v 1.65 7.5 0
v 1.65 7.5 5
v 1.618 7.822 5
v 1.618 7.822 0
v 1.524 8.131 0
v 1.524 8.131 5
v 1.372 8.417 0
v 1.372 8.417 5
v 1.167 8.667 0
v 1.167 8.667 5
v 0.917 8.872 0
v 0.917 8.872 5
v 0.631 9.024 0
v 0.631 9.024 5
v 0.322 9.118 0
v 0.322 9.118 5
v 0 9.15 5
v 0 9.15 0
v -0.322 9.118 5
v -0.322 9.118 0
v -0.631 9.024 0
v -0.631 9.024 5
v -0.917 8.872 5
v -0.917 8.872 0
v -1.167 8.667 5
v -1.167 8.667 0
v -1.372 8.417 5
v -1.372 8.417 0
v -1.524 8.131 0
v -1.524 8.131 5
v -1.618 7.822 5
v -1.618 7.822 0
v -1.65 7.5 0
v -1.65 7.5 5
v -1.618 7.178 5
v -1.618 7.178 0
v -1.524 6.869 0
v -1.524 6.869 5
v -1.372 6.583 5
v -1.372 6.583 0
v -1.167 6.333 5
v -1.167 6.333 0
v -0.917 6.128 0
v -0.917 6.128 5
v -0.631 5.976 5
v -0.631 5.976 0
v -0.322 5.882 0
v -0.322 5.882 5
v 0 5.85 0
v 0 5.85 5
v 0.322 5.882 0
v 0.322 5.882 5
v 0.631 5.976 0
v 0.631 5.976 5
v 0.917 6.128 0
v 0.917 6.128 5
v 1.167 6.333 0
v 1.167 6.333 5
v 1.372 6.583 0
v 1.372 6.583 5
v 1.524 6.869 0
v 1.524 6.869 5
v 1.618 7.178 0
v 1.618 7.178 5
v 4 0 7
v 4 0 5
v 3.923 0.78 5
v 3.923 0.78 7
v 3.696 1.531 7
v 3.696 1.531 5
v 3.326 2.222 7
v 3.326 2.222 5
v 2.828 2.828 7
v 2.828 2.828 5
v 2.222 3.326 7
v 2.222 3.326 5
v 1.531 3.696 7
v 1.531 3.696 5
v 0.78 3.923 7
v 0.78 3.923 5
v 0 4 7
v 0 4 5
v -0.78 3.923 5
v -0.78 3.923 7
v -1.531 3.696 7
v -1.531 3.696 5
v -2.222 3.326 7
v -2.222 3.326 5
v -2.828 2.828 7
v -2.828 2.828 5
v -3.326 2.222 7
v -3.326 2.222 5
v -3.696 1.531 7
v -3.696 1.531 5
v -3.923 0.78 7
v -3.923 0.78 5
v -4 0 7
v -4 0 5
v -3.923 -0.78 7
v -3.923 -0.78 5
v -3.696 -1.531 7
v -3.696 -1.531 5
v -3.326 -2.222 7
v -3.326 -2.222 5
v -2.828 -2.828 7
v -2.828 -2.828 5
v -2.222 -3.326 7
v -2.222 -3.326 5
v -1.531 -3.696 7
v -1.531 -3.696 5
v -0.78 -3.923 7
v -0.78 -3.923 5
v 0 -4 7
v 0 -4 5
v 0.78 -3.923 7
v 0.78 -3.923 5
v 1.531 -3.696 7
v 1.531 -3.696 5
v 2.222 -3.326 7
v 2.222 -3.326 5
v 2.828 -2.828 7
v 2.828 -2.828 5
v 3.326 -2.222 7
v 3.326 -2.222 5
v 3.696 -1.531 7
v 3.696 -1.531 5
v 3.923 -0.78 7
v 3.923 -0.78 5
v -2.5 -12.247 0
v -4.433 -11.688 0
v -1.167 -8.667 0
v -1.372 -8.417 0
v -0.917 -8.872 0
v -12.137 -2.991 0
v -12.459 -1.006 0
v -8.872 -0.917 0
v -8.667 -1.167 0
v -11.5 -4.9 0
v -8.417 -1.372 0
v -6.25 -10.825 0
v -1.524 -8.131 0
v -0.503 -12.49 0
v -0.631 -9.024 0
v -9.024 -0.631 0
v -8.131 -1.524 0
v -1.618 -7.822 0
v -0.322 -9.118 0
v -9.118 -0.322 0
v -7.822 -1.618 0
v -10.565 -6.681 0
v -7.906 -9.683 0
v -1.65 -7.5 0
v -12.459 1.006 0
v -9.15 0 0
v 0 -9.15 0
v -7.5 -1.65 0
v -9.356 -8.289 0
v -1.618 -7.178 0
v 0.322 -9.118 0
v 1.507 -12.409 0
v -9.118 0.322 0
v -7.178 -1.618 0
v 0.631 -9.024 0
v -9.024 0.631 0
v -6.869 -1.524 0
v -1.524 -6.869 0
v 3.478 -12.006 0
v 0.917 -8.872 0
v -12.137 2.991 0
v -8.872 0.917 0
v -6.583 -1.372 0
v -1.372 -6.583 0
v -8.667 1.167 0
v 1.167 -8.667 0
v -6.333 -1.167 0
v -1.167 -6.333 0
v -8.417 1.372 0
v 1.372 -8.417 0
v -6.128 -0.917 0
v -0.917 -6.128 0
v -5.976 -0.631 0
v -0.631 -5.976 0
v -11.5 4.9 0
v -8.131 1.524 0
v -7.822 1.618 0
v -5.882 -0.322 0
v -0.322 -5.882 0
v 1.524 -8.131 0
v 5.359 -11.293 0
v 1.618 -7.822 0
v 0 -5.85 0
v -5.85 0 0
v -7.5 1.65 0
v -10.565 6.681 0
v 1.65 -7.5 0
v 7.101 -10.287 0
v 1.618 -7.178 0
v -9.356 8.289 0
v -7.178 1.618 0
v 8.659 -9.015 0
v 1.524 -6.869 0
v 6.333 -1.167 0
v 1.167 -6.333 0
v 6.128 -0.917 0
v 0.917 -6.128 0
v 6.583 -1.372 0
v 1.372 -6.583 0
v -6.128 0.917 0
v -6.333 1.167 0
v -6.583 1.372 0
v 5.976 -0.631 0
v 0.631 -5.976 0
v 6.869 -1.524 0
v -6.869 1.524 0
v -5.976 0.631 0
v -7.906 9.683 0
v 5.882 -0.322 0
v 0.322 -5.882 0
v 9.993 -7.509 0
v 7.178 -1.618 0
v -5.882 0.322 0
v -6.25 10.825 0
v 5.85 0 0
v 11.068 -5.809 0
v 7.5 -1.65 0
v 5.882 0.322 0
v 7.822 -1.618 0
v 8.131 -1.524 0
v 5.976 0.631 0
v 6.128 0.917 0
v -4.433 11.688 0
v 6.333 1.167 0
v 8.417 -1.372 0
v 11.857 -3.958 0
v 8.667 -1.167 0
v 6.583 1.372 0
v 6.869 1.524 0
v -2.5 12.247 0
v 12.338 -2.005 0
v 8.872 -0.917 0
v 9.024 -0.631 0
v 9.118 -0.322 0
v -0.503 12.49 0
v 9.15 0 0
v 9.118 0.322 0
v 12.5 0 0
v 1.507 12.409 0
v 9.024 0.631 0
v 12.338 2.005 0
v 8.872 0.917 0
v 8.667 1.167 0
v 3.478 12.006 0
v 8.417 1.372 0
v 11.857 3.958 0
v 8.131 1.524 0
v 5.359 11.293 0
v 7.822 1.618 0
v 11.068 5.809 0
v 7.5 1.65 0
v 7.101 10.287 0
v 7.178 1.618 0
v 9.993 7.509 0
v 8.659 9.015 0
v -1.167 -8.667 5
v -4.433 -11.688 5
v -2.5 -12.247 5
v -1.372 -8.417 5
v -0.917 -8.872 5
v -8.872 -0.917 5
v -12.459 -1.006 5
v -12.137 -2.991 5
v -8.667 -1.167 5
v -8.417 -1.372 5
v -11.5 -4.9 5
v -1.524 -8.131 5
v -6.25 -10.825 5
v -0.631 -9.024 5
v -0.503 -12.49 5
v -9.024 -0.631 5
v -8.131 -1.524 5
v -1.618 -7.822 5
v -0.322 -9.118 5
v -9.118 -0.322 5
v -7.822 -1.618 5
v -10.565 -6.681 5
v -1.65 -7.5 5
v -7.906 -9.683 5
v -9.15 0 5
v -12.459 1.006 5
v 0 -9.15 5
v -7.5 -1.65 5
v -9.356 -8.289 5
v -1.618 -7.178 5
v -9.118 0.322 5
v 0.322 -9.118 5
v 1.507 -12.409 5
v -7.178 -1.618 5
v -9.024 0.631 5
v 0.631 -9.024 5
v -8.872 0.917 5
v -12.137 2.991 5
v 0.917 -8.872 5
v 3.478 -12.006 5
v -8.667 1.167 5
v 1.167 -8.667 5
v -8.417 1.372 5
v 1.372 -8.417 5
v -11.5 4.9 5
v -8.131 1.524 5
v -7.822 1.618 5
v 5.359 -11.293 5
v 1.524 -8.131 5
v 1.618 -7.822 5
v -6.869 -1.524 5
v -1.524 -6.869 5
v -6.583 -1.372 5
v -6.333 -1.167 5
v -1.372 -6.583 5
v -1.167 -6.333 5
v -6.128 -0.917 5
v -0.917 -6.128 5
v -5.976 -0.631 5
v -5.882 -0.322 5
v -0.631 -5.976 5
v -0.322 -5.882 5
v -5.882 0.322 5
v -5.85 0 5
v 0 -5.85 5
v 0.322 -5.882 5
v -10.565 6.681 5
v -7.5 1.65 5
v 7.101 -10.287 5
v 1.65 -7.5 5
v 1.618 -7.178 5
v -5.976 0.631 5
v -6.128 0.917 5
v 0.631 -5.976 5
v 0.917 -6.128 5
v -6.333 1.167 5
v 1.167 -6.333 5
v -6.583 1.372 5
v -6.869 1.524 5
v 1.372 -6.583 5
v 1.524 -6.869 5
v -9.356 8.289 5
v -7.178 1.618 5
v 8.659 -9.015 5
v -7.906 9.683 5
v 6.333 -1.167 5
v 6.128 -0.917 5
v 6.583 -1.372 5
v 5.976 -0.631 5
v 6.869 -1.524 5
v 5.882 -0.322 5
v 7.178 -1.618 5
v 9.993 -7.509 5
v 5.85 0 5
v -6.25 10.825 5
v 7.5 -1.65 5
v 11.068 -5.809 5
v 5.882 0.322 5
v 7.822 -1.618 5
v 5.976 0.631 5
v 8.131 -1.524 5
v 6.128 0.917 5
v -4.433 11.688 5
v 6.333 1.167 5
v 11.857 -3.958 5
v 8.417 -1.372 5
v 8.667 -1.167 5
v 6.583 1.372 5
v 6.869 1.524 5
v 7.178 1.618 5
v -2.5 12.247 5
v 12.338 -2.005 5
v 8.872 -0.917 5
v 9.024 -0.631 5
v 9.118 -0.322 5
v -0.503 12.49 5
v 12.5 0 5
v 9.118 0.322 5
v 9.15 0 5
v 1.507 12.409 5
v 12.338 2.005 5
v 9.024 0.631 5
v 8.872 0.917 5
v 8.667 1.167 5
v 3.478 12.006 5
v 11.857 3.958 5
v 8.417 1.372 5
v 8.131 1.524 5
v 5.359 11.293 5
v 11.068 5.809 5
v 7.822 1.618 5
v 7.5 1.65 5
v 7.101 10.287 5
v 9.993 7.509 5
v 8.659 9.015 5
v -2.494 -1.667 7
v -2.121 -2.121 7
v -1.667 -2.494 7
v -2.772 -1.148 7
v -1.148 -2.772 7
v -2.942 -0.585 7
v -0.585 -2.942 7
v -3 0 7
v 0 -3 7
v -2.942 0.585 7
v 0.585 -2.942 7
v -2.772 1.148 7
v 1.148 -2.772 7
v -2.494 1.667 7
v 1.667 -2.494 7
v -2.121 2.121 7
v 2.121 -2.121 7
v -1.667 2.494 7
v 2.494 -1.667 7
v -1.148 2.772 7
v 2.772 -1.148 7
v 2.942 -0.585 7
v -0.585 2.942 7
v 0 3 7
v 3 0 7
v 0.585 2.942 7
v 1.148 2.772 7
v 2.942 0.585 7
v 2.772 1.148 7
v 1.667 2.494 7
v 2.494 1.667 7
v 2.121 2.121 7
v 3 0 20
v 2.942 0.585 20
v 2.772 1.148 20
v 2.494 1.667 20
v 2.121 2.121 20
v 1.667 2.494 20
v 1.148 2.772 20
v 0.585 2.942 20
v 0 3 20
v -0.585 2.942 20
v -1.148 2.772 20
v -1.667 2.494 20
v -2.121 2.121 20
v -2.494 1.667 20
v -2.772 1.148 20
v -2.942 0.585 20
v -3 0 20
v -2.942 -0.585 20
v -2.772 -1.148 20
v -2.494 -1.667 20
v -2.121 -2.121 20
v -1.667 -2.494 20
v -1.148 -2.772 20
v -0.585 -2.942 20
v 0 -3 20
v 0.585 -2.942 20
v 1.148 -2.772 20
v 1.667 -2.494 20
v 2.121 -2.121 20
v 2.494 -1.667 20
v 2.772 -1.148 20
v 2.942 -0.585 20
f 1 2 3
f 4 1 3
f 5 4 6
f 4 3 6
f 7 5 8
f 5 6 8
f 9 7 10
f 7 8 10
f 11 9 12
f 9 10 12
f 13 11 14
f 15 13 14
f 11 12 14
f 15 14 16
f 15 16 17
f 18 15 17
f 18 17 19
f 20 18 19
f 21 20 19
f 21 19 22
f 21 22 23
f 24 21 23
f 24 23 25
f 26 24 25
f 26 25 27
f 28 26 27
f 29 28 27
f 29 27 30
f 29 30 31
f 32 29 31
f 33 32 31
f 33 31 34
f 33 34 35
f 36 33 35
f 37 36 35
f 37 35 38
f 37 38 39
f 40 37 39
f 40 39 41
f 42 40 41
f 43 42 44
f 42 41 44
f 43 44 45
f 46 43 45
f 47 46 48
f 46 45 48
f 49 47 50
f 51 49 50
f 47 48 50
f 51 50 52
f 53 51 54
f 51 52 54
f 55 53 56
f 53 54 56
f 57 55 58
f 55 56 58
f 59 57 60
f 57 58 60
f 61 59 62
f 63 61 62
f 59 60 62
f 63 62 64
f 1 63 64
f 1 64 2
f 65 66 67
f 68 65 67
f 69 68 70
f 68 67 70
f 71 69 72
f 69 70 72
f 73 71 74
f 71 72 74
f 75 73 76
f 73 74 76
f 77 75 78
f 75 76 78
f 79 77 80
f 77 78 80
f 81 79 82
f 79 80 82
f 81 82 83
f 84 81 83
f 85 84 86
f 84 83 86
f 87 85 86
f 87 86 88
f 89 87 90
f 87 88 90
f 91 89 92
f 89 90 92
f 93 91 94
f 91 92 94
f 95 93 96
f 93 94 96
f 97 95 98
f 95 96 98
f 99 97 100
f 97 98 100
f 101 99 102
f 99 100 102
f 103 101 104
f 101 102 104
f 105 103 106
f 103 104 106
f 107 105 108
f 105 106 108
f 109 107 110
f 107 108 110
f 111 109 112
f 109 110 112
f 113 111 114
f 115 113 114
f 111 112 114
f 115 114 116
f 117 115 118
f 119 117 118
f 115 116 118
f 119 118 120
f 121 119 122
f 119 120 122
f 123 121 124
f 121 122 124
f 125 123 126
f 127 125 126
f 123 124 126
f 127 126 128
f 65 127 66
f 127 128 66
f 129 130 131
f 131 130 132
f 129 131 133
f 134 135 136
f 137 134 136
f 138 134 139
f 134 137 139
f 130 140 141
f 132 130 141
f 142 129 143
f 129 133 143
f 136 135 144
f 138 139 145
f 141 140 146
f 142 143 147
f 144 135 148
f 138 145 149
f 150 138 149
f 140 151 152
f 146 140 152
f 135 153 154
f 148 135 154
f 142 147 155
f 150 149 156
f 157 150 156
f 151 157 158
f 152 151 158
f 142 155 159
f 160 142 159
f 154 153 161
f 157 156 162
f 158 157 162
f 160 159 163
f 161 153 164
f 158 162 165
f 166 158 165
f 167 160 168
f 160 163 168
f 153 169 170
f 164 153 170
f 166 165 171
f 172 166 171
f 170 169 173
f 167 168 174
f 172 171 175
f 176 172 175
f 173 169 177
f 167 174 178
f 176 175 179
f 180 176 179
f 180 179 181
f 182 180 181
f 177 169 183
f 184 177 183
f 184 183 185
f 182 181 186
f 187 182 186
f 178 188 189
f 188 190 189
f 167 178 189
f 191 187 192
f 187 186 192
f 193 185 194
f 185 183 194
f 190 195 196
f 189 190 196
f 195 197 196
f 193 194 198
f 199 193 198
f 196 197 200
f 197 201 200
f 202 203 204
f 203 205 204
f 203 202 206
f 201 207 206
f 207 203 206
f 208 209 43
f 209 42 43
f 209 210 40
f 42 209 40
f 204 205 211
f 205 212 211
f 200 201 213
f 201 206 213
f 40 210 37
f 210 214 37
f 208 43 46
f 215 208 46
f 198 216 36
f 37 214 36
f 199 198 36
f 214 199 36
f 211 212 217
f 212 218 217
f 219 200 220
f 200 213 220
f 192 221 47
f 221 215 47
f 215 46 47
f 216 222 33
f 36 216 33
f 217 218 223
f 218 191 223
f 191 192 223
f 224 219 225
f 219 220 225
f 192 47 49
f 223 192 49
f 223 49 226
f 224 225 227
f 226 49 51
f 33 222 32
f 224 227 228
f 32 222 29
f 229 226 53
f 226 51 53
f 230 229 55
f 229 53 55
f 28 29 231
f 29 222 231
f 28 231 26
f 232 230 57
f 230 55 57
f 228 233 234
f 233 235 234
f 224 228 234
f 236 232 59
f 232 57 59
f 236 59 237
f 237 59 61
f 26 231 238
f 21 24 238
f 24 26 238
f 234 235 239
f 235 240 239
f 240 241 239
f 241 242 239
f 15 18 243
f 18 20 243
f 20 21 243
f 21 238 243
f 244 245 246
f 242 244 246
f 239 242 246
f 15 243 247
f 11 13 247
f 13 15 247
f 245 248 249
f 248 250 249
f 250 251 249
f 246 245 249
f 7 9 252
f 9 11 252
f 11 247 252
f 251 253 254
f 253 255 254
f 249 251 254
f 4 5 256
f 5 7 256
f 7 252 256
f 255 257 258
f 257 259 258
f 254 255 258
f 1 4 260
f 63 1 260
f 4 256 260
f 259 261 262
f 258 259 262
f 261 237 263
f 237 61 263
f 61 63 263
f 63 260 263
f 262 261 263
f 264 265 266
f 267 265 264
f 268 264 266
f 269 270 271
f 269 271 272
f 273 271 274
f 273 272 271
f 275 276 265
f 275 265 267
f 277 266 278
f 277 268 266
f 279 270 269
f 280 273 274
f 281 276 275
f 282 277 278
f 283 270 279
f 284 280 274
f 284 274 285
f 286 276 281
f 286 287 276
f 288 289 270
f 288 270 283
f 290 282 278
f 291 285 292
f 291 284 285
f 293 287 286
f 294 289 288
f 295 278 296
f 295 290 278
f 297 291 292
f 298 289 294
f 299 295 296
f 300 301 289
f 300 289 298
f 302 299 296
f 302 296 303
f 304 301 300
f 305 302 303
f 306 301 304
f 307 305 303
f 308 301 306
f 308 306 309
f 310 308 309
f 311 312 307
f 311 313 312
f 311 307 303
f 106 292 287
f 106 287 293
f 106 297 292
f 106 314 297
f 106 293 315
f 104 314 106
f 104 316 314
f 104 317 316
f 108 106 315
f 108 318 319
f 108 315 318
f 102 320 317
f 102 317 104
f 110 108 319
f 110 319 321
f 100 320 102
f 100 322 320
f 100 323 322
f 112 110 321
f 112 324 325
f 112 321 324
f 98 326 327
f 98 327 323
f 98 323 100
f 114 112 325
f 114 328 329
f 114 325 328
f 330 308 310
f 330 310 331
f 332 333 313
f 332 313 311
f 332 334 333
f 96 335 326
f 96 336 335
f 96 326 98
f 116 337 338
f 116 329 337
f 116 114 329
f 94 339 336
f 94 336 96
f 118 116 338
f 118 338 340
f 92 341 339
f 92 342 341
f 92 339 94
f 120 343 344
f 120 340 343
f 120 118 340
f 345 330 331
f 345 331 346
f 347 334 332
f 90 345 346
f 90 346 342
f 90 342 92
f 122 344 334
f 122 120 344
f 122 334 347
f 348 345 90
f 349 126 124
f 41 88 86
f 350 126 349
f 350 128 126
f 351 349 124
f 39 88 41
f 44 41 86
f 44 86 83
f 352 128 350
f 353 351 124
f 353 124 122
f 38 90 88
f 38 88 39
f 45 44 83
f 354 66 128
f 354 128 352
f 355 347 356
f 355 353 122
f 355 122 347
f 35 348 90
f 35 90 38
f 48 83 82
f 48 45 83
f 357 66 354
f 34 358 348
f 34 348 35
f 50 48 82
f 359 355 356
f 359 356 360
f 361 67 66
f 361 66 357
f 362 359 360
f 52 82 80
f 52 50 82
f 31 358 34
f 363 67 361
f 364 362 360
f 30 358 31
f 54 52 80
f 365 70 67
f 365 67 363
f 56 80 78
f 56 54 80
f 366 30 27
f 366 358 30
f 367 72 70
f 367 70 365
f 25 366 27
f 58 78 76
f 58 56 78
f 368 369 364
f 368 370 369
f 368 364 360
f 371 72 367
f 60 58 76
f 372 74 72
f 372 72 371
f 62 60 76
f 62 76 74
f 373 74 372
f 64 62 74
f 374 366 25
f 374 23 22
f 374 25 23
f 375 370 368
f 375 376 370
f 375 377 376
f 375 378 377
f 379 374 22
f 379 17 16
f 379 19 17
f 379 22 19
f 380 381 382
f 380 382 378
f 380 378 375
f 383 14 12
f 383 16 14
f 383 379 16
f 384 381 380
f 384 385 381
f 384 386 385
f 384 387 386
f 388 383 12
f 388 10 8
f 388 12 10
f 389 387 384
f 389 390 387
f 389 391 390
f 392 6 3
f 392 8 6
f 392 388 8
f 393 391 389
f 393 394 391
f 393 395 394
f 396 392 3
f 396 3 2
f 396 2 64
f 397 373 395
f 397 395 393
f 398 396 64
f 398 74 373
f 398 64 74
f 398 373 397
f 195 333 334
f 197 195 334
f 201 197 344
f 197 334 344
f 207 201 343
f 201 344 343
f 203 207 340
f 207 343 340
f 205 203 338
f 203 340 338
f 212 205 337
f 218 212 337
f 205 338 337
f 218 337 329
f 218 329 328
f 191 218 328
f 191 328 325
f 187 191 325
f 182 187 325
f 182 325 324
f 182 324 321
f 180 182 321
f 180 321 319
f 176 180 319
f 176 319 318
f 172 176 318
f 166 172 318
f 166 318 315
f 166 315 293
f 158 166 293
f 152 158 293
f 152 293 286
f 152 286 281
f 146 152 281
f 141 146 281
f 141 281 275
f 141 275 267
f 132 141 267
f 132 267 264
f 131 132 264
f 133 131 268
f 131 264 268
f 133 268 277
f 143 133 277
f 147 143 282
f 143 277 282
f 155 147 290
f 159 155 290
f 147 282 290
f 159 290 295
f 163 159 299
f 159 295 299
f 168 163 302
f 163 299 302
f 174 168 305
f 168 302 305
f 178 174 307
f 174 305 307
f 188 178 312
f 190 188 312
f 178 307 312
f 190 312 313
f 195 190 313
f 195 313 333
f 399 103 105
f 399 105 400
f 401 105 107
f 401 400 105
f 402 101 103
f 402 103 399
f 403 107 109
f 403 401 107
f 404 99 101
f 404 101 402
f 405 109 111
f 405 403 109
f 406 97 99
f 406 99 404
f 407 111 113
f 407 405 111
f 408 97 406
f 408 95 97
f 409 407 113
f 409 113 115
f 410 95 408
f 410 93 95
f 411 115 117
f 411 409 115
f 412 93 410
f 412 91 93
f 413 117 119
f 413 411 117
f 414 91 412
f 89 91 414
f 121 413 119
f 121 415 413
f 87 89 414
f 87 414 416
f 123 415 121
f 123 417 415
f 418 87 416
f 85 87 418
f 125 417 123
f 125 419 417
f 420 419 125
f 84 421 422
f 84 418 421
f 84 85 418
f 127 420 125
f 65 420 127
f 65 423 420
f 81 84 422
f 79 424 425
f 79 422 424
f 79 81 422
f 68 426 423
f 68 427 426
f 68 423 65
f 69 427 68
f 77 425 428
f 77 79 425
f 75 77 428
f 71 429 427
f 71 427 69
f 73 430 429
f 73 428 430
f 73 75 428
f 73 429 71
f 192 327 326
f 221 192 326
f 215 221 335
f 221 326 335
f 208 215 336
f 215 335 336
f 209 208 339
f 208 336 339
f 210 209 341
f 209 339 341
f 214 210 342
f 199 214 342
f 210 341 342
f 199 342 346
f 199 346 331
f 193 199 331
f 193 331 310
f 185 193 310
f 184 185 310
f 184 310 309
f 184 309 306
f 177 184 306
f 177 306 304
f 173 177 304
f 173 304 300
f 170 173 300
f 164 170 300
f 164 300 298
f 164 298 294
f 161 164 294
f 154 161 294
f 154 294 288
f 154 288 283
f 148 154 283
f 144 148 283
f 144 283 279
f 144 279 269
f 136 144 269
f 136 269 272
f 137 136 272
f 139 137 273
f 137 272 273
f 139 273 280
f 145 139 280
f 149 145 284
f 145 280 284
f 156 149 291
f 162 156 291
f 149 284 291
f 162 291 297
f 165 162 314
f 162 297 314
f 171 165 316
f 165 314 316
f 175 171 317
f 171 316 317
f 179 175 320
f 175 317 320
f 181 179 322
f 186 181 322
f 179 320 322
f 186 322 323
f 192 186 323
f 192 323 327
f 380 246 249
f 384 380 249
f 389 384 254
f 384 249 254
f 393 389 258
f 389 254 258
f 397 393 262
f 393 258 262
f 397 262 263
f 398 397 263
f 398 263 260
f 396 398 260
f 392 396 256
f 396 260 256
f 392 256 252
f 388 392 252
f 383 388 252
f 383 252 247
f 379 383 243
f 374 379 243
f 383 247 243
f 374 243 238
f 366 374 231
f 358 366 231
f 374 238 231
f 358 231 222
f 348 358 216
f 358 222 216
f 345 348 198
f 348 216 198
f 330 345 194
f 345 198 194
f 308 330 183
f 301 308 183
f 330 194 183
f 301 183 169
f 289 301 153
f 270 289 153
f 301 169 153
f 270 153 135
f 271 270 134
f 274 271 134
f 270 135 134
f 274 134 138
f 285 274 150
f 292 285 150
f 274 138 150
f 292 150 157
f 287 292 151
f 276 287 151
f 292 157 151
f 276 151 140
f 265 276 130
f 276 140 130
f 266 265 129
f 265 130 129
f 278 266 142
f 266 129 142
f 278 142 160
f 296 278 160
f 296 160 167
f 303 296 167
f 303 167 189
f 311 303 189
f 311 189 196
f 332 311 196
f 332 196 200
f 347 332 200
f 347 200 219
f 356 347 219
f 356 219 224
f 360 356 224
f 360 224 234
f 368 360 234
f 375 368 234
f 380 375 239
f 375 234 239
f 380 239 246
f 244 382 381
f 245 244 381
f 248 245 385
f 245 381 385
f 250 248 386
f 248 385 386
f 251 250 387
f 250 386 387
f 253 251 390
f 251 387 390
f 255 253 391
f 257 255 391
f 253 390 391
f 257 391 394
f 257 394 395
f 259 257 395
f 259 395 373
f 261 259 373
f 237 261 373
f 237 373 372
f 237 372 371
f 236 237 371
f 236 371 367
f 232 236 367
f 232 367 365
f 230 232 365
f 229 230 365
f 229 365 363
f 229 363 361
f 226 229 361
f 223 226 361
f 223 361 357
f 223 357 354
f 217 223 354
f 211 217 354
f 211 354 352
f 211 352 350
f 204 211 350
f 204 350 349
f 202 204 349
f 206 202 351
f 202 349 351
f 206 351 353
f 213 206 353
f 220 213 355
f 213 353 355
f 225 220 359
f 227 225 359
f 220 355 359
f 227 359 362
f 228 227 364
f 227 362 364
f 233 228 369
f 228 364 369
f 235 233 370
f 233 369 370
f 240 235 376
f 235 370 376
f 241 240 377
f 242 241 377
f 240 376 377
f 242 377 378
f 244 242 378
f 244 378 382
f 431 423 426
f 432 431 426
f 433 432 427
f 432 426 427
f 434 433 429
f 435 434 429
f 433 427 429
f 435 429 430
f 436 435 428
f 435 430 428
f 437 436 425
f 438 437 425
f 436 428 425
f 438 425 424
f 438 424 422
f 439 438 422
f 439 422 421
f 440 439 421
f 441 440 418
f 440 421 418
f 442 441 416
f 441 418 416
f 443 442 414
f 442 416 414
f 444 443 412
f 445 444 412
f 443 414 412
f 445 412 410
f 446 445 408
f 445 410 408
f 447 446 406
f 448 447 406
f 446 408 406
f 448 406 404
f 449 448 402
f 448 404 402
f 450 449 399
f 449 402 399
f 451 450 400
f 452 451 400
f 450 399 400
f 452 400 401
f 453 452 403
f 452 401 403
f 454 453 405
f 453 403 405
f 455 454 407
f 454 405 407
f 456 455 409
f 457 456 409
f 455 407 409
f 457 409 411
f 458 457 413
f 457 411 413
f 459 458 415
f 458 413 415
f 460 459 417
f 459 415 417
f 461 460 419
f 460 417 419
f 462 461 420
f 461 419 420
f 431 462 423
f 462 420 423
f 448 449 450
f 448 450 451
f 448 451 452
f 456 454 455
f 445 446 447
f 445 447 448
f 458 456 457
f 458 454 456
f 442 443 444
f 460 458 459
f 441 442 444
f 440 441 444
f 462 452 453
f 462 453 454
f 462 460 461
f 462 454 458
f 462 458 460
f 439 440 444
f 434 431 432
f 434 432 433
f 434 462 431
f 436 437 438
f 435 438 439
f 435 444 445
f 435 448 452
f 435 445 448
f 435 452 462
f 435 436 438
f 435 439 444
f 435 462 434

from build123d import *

# Parameters (mm, degrees)
SKETCH_1_R          = 12.5
EXTRUDE_1_DEPTH     = 5
SKETCH_2_R          = 4
EXTRUDE_2_DEPTH     = 2
SKETCH_3_R          = 3
EXTRUDE_3_DEPTH     = 13
SKETCH_4_R          = 1.65
CUT_EXTRUDE_1_DEPTH = 24.184046239


with BuildPart() as part:
    # ｽｹｯﾁ1 → ﾎﾞｽ - 押し出し1 (new body)
    with BuildSketch(Plane.XY):
        Circle(SKETCH_1_R)
    extrude(amount=EXTRUDE_1_DEPTH)

    # ｽｹｯﾁ2 → ﾎﾞｽ - 押し出し2 (add)
    with BuildSketch(Plane.XY.offset(5)):
        Circle(SKETCH_2_R)
    extrude(amount=EXTRUDE_2_DEPTH)

    # ｽｹｯﾁ3 → ﾎﾞｽ - 押し出し3 (add)
    with BuildSketch(Plane.XY.offset(7)):
        Circle(SKETCH_3_R)
    extrude(amount=EXTRUDE_3_DEPTH)

    # ｽｹｯﾁ4 → ｶｯﾄ - 押し出し1 (cut, through all)
    with BuildSketch(Plane.XY.offset(5)):
        with Locations((0, 7.5)):
            Circle(SKETCH_4_R)
        with Locations((7.5, 0)):
            Circle(SKETCH_4_R)
        with Locations((0, -7.5)):
            Circle(SKETCH_4_R)
        with Locations((-7.5, 0)):
            Circle(SKETCH_4_R)
    extrude(amount=-CUT_EXTRUDE_1_DEPTH, mode=Mode.SUBTRACT)


solid = part.part
